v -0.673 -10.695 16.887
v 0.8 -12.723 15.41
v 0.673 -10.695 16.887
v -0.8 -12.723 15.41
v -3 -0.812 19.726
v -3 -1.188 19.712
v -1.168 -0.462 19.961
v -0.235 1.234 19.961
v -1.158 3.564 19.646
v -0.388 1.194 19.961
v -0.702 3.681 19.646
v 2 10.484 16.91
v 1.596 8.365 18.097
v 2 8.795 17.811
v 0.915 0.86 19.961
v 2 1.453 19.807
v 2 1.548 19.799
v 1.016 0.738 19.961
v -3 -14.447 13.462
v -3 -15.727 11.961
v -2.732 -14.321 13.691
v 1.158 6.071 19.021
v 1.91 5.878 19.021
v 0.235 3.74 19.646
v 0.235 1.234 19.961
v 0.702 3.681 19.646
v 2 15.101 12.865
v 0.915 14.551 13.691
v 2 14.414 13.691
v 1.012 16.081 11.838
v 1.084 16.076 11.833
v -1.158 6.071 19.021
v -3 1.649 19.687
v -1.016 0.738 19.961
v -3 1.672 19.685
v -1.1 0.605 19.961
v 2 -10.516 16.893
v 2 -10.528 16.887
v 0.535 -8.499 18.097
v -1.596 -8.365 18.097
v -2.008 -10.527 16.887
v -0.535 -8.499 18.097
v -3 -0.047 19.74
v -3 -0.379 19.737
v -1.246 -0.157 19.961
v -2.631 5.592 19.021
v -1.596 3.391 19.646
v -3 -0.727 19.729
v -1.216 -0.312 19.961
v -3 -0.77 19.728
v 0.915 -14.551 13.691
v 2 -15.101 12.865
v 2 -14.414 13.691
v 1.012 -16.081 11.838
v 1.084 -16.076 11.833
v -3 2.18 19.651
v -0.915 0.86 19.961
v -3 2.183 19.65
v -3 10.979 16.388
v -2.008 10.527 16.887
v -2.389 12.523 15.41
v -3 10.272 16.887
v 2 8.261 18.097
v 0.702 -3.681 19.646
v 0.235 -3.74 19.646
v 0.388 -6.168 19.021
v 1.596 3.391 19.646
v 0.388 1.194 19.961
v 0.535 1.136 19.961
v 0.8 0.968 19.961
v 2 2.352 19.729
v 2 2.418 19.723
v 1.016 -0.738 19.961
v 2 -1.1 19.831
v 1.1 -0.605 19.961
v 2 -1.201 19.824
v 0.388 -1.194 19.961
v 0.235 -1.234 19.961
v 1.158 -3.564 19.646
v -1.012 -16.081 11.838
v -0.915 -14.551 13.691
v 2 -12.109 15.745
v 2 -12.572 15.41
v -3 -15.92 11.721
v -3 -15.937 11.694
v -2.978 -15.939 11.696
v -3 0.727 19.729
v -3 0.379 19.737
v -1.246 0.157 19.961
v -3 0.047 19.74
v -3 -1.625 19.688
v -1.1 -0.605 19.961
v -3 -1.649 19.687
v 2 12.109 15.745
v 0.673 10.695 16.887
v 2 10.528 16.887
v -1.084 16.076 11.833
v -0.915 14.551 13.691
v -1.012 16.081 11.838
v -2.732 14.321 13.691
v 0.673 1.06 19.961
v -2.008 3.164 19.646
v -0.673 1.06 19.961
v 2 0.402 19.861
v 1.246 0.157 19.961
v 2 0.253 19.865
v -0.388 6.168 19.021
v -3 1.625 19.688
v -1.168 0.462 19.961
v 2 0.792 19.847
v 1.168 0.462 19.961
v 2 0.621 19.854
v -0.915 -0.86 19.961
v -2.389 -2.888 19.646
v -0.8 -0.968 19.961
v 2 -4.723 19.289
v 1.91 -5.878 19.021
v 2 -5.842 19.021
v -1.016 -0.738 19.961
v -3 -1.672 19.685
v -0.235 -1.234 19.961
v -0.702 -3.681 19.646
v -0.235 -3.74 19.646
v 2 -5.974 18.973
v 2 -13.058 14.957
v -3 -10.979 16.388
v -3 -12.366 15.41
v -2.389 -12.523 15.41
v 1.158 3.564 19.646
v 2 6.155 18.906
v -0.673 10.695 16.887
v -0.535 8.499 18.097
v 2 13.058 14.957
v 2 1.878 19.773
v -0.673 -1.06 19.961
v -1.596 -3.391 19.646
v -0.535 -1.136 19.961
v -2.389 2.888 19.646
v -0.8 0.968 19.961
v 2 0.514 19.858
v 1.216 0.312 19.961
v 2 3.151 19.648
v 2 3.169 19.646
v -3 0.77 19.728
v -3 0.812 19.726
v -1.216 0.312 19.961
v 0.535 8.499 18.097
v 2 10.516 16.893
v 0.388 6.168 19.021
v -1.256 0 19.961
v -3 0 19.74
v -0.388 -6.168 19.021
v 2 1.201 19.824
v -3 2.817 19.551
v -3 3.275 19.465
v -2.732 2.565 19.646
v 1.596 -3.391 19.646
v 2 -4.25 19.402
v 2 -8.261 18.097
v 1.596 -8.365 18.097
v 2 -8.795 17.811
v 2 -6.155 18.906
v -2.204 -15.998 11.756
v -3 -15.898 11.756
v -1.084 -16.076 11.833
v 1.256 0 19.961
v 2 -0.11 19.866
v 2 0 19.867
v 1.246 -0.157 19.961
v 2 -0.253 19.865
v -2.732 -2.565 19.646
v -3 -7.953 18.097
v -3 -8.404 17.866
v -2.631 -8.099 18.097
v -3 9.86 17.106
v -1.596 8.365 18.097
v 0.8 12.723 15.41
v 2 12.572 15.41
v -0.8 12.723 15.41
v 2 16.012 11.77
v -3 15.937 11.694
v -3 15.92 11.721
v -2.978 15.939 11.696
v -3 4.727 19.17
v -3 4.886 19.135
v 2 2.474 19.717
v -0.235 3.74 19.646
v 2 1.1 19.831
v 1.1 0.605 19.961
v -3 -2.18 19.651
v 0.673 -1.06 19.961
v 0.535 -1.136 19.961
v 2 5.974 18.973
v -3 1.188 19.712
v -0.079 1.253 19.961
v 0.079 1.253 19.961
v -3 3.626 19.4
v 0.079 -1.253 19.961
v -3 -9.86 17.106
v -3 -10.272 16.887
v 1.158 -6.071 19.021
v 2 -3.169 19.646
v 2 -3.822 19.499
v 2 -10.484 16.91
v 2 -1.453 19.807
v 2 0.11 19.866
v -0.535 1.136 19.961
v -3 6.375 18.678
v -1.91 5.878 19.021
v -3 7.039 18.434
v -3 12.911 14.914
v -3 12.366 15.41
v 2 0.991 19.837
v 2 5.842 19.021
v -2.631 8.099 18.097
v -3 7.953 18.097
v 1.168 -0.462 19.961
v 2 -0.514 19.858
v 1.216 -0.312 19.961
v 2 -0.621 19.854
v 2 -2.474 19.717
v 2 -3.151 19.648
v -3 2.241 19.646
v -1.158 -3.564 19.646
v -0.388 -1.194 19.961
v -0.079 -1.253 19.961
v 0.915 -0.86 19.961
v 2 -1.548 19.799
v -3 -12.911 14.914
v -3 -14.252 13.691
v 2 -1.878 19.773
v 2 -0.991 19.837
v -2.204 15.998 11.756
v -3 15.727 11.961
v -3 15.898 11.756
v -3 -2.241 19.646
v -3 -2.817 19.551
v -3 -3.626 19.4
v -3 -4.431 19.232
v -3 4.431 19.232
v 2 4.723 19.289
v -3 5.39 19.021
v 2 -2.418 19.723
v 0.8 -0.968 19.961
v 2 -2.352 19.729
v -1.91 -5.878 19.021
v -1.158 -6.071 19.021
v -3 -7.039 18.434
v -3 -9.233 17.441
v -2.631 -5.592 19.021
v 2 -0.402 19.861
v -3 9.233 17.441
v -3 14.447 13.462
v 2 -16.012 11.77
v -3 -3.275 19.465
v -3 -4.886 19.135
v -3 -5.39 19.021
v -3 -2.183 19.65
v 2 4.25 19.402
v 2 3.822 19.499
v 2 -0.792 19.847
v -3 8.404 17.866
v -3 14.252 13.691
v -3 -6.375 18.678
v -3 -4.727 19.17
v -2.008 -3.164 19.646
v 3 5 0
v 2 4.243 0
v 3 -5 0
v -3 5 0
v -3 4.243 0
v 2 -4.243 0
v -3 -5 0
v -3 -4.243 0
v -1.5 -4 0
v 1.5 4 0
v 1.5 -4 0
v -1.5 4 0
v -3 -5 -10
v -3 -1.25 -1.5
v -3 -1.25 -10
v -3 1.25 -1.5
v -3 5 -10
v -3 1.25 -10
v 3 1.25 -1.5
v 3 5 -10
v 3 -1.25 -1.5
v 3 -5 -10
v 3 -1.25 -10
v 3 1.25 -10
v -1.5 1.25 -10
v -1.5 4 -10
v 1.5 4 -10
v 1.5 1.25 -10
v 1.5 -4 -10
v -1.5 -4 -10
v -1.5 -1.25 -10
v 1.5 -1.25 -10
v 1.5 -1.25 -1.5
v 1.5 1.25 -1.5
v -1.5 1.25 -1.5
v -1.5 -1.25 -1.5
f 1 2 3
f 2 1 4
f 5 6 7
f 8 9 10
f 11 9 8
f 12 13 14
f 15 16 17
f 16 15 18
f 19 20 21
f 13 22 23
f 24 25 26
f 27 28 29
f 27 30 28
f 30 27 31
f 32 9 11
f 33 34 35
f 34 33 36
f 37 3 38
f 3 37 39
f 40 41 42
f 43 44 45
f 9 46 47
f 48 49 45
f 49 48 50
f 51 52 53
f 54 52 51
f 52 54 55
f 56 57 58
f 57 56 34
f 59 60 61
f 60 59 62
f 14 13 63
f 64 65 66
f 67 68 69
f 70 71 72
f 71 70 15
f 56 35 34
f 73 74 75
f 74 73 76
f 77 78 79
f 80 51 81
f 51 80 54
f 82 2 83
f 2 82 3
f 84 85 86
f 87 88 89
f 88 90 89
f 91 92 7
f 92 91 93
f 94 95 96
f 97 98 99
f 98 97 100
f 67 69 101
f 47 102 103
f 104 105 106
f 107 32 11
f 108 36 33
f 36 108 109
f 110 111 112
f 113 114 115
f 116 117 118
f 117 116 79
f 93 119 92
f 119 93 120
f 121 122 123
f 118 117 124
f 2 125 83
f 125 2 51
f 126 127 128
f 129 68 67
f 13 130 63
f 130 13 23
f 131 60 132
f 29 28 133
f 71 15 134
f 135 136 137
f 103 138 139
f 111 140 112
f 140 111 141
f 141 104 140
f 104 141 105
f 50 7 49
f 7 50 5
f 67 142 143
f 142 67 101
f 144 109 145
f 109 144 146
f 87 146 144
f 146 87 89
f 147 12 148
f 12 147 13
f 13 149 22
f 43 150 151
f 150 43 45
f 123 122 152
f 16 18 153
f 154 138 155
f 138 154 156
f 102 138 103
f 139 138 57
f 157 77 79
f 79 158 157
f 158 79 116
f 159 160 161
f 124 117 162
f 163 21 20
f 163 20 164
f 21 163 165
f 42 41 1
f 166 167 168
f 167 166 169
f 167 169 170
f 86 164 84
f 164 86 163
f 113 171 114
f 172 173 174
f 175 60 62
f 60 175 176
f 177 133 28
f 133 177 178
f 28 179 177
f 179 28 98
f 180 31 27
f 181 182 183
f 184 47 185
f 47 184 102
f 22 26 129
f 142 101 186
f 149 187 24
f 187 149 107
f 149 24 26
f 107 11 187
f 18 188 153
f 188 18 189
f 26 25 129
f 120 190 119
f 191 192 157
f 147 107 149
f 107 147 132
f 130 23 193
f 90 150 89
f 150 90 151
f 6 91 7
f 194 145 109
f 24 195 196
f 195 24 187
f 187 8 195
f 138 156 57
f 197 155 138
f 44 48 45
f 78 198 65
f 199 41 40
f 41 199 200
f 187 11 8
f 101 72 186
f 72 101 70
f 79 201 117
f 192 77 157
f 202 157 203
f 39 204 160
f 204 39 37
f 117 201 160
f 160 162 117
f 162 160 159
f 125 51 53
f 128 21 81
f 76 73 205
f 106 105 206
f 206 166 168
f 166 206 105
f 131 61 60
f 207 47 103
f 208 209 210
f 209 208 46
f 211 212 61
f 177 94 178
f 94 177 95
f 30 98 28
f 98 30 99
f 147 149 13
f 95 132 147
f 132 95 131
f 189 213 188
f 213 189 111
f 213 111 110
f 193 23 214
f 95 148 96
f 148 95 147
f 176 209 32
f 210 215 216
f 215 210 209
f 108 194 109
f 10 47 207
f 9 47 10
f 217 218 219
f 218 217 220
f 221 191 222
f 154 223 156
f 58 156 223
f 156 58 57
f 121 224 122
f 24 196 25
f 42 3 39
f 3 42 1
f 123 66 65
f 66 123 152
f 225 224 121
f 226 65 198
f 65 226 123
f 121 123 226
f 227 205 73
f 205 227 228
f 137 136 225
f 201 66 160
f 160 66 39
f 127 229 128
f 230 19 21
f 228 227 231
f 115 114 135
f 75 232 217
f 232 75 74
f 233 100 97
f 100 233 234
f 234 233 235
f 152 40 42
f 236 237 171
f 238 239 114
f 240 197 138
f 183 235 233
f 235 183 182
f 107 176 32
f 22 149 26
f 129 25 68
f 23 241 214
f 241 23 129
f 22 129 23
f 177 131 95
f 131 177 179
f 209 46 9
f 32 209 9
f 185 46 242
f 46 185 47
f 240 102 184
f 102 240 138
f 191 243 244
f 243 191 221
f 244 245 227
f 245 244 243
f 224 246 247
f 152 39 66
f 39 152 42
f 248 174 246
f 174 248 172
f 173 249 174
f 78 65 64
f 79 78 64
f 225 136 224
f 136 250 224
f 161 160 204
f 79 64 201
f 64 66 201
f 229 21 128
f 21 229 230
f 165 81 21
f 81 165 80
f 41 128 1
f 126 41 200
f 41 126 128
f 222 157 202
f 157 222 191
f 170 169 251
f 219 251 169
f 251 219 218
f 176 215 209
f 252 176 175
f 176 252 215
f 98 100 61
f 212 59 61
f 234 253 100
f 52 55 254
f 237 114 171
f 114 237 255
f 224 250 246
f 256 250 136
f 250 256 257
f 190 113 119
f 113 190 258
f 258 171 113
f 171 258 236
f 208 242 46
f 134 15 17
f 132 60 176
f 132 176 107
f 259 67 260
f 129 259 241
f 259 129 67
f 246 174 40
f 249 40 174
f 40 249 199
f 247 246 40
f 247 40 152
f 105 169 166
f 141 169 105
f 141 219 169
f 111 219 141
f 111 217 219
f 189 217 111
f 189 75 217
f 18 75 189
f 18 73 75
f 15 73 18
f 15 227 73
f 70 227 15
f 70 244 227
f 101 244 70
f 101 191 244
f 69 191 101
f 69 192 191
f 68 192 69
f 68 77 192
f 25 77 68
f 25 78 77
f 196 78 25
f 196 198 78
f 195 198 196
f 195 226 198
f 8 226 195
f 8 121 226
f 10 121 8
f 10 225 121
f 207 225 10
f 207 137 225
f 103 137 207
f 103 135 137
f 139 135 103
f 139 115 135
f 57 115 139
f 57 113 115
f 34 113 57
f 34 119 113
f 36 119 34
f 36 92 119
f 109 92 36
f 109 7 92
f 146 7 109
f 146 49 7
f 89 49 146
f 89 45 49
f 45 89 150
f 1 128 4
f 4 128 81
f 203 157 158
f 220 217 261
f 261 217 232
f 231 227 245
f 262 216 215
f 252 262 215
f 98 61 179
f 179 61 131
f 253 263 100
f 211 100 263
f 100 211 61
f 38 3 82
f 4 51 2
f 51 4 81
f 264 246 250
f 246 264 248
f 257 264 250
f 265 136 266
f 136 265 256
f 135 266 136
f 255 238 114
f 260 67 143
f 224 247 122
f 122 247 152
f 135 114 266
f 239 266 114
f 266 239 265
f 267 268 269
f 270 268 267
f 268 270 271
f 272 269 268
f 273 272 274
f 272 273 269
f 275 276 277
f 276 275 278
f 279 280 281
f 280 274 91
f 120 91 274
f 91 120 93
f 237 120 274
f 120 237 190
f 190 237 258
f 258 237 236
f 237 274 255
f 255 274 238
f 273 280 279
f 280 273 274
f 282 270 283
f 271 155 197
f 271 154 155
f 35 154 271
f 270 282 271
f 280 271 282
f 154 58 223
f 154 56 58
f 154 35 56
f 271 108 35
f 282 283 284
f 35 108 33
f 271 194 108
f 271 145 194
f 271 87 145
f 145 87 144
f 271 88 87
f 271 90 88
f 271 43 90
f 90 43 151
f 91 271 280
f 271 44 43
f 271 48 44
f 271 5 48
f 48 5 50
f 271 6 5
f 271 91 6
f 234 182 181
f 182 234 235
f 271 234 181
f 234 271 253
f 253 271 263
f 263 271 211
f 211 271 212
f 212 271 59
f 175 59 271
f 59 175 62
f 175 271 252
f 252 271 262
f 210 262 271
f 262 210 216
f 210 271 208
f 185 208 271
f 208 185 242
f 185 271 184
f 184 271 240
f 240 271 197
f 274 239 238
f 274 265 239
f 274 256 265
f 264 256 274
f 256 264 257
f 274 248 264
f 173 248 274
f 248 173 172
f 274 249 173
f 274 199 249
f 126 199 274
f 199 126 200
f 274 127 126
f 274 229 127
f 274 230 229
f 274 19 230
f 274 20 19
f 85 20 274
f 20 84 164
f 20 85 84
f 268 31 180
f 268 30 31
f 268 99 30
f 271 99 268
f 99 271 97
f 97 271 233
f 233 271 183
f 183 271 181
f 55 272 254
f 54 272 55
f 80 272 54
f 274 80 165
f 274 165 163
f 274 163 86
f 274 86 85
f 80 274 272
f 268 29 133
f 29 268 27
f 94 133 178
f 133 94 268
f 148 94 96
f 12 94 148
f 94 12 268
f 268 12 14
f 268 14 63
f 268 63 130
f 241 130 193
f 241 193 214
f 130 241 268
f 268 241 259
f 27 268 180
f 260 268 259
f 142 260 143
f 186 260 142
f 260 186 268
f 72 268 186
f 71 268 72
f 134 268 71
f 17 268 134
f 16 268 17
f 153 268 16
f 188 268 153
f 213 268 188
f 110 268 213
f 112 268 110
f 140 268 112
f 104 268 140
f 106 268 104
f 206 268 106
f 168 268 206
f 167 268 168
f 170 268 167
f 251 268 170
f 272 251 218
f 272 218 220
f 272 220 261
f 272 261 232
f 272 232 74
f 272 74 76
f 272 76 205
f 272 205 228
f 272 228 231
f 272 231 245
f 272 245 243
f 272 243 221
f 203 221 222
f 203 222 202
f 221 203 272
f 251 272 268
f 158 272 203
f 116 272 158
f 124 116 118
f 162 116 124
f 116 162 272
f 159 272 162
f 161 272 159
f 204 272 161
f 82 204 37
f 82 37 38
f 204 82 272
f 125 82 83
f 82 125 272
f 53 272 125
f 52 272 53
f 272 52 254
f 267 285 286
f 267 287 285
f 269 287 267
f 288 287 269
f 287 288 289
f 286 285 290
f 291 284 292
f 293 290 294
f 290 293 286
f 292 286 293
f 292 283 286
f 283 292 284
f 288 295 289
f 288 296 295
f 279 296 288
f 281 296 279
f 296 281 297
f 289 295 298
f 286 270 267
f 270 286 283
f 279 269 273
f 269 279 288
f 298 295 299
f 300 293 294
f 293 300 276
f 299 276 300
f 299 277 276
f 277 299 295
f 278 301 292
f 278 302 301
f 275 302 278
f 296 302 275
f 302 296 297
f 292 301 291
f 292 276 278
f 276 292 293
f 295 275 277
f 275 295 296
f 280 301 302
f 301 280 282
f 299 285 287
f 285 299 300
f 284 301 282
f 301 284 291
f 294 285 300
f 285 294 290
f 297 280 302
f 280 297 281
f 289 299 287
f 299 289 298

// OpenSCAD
connector_height = 10;
connector_width = 10;
connector_thickness = 6;
cross_1_thickness = 3;
cross_2_thickness = 2.5;

union(){
intersection(){
difference()
{
    sphere(r=20, center = true, $fn=50);
    translate([-20,-20,-40]) cube([40,40,40]); //bottom
   
}
 rotate([45,0,0])
        translate([-3,-3,-3]) cube([5,30,30]); //border
}
translate([0,0,-connector_height/2])
    difference(){
        cube([connector_thickness,connector_width,connector_height], center = true); // bottom cube
        cube([cross_1_thickness,connector_width-2,connector_height], center=true); // partial cut
        translate([0,0,-1]) // complete cut
            rotate([0,0,90]) cube([cross_2_thickness,connector_width-2,connector_height-1], center =true);
        }
}
